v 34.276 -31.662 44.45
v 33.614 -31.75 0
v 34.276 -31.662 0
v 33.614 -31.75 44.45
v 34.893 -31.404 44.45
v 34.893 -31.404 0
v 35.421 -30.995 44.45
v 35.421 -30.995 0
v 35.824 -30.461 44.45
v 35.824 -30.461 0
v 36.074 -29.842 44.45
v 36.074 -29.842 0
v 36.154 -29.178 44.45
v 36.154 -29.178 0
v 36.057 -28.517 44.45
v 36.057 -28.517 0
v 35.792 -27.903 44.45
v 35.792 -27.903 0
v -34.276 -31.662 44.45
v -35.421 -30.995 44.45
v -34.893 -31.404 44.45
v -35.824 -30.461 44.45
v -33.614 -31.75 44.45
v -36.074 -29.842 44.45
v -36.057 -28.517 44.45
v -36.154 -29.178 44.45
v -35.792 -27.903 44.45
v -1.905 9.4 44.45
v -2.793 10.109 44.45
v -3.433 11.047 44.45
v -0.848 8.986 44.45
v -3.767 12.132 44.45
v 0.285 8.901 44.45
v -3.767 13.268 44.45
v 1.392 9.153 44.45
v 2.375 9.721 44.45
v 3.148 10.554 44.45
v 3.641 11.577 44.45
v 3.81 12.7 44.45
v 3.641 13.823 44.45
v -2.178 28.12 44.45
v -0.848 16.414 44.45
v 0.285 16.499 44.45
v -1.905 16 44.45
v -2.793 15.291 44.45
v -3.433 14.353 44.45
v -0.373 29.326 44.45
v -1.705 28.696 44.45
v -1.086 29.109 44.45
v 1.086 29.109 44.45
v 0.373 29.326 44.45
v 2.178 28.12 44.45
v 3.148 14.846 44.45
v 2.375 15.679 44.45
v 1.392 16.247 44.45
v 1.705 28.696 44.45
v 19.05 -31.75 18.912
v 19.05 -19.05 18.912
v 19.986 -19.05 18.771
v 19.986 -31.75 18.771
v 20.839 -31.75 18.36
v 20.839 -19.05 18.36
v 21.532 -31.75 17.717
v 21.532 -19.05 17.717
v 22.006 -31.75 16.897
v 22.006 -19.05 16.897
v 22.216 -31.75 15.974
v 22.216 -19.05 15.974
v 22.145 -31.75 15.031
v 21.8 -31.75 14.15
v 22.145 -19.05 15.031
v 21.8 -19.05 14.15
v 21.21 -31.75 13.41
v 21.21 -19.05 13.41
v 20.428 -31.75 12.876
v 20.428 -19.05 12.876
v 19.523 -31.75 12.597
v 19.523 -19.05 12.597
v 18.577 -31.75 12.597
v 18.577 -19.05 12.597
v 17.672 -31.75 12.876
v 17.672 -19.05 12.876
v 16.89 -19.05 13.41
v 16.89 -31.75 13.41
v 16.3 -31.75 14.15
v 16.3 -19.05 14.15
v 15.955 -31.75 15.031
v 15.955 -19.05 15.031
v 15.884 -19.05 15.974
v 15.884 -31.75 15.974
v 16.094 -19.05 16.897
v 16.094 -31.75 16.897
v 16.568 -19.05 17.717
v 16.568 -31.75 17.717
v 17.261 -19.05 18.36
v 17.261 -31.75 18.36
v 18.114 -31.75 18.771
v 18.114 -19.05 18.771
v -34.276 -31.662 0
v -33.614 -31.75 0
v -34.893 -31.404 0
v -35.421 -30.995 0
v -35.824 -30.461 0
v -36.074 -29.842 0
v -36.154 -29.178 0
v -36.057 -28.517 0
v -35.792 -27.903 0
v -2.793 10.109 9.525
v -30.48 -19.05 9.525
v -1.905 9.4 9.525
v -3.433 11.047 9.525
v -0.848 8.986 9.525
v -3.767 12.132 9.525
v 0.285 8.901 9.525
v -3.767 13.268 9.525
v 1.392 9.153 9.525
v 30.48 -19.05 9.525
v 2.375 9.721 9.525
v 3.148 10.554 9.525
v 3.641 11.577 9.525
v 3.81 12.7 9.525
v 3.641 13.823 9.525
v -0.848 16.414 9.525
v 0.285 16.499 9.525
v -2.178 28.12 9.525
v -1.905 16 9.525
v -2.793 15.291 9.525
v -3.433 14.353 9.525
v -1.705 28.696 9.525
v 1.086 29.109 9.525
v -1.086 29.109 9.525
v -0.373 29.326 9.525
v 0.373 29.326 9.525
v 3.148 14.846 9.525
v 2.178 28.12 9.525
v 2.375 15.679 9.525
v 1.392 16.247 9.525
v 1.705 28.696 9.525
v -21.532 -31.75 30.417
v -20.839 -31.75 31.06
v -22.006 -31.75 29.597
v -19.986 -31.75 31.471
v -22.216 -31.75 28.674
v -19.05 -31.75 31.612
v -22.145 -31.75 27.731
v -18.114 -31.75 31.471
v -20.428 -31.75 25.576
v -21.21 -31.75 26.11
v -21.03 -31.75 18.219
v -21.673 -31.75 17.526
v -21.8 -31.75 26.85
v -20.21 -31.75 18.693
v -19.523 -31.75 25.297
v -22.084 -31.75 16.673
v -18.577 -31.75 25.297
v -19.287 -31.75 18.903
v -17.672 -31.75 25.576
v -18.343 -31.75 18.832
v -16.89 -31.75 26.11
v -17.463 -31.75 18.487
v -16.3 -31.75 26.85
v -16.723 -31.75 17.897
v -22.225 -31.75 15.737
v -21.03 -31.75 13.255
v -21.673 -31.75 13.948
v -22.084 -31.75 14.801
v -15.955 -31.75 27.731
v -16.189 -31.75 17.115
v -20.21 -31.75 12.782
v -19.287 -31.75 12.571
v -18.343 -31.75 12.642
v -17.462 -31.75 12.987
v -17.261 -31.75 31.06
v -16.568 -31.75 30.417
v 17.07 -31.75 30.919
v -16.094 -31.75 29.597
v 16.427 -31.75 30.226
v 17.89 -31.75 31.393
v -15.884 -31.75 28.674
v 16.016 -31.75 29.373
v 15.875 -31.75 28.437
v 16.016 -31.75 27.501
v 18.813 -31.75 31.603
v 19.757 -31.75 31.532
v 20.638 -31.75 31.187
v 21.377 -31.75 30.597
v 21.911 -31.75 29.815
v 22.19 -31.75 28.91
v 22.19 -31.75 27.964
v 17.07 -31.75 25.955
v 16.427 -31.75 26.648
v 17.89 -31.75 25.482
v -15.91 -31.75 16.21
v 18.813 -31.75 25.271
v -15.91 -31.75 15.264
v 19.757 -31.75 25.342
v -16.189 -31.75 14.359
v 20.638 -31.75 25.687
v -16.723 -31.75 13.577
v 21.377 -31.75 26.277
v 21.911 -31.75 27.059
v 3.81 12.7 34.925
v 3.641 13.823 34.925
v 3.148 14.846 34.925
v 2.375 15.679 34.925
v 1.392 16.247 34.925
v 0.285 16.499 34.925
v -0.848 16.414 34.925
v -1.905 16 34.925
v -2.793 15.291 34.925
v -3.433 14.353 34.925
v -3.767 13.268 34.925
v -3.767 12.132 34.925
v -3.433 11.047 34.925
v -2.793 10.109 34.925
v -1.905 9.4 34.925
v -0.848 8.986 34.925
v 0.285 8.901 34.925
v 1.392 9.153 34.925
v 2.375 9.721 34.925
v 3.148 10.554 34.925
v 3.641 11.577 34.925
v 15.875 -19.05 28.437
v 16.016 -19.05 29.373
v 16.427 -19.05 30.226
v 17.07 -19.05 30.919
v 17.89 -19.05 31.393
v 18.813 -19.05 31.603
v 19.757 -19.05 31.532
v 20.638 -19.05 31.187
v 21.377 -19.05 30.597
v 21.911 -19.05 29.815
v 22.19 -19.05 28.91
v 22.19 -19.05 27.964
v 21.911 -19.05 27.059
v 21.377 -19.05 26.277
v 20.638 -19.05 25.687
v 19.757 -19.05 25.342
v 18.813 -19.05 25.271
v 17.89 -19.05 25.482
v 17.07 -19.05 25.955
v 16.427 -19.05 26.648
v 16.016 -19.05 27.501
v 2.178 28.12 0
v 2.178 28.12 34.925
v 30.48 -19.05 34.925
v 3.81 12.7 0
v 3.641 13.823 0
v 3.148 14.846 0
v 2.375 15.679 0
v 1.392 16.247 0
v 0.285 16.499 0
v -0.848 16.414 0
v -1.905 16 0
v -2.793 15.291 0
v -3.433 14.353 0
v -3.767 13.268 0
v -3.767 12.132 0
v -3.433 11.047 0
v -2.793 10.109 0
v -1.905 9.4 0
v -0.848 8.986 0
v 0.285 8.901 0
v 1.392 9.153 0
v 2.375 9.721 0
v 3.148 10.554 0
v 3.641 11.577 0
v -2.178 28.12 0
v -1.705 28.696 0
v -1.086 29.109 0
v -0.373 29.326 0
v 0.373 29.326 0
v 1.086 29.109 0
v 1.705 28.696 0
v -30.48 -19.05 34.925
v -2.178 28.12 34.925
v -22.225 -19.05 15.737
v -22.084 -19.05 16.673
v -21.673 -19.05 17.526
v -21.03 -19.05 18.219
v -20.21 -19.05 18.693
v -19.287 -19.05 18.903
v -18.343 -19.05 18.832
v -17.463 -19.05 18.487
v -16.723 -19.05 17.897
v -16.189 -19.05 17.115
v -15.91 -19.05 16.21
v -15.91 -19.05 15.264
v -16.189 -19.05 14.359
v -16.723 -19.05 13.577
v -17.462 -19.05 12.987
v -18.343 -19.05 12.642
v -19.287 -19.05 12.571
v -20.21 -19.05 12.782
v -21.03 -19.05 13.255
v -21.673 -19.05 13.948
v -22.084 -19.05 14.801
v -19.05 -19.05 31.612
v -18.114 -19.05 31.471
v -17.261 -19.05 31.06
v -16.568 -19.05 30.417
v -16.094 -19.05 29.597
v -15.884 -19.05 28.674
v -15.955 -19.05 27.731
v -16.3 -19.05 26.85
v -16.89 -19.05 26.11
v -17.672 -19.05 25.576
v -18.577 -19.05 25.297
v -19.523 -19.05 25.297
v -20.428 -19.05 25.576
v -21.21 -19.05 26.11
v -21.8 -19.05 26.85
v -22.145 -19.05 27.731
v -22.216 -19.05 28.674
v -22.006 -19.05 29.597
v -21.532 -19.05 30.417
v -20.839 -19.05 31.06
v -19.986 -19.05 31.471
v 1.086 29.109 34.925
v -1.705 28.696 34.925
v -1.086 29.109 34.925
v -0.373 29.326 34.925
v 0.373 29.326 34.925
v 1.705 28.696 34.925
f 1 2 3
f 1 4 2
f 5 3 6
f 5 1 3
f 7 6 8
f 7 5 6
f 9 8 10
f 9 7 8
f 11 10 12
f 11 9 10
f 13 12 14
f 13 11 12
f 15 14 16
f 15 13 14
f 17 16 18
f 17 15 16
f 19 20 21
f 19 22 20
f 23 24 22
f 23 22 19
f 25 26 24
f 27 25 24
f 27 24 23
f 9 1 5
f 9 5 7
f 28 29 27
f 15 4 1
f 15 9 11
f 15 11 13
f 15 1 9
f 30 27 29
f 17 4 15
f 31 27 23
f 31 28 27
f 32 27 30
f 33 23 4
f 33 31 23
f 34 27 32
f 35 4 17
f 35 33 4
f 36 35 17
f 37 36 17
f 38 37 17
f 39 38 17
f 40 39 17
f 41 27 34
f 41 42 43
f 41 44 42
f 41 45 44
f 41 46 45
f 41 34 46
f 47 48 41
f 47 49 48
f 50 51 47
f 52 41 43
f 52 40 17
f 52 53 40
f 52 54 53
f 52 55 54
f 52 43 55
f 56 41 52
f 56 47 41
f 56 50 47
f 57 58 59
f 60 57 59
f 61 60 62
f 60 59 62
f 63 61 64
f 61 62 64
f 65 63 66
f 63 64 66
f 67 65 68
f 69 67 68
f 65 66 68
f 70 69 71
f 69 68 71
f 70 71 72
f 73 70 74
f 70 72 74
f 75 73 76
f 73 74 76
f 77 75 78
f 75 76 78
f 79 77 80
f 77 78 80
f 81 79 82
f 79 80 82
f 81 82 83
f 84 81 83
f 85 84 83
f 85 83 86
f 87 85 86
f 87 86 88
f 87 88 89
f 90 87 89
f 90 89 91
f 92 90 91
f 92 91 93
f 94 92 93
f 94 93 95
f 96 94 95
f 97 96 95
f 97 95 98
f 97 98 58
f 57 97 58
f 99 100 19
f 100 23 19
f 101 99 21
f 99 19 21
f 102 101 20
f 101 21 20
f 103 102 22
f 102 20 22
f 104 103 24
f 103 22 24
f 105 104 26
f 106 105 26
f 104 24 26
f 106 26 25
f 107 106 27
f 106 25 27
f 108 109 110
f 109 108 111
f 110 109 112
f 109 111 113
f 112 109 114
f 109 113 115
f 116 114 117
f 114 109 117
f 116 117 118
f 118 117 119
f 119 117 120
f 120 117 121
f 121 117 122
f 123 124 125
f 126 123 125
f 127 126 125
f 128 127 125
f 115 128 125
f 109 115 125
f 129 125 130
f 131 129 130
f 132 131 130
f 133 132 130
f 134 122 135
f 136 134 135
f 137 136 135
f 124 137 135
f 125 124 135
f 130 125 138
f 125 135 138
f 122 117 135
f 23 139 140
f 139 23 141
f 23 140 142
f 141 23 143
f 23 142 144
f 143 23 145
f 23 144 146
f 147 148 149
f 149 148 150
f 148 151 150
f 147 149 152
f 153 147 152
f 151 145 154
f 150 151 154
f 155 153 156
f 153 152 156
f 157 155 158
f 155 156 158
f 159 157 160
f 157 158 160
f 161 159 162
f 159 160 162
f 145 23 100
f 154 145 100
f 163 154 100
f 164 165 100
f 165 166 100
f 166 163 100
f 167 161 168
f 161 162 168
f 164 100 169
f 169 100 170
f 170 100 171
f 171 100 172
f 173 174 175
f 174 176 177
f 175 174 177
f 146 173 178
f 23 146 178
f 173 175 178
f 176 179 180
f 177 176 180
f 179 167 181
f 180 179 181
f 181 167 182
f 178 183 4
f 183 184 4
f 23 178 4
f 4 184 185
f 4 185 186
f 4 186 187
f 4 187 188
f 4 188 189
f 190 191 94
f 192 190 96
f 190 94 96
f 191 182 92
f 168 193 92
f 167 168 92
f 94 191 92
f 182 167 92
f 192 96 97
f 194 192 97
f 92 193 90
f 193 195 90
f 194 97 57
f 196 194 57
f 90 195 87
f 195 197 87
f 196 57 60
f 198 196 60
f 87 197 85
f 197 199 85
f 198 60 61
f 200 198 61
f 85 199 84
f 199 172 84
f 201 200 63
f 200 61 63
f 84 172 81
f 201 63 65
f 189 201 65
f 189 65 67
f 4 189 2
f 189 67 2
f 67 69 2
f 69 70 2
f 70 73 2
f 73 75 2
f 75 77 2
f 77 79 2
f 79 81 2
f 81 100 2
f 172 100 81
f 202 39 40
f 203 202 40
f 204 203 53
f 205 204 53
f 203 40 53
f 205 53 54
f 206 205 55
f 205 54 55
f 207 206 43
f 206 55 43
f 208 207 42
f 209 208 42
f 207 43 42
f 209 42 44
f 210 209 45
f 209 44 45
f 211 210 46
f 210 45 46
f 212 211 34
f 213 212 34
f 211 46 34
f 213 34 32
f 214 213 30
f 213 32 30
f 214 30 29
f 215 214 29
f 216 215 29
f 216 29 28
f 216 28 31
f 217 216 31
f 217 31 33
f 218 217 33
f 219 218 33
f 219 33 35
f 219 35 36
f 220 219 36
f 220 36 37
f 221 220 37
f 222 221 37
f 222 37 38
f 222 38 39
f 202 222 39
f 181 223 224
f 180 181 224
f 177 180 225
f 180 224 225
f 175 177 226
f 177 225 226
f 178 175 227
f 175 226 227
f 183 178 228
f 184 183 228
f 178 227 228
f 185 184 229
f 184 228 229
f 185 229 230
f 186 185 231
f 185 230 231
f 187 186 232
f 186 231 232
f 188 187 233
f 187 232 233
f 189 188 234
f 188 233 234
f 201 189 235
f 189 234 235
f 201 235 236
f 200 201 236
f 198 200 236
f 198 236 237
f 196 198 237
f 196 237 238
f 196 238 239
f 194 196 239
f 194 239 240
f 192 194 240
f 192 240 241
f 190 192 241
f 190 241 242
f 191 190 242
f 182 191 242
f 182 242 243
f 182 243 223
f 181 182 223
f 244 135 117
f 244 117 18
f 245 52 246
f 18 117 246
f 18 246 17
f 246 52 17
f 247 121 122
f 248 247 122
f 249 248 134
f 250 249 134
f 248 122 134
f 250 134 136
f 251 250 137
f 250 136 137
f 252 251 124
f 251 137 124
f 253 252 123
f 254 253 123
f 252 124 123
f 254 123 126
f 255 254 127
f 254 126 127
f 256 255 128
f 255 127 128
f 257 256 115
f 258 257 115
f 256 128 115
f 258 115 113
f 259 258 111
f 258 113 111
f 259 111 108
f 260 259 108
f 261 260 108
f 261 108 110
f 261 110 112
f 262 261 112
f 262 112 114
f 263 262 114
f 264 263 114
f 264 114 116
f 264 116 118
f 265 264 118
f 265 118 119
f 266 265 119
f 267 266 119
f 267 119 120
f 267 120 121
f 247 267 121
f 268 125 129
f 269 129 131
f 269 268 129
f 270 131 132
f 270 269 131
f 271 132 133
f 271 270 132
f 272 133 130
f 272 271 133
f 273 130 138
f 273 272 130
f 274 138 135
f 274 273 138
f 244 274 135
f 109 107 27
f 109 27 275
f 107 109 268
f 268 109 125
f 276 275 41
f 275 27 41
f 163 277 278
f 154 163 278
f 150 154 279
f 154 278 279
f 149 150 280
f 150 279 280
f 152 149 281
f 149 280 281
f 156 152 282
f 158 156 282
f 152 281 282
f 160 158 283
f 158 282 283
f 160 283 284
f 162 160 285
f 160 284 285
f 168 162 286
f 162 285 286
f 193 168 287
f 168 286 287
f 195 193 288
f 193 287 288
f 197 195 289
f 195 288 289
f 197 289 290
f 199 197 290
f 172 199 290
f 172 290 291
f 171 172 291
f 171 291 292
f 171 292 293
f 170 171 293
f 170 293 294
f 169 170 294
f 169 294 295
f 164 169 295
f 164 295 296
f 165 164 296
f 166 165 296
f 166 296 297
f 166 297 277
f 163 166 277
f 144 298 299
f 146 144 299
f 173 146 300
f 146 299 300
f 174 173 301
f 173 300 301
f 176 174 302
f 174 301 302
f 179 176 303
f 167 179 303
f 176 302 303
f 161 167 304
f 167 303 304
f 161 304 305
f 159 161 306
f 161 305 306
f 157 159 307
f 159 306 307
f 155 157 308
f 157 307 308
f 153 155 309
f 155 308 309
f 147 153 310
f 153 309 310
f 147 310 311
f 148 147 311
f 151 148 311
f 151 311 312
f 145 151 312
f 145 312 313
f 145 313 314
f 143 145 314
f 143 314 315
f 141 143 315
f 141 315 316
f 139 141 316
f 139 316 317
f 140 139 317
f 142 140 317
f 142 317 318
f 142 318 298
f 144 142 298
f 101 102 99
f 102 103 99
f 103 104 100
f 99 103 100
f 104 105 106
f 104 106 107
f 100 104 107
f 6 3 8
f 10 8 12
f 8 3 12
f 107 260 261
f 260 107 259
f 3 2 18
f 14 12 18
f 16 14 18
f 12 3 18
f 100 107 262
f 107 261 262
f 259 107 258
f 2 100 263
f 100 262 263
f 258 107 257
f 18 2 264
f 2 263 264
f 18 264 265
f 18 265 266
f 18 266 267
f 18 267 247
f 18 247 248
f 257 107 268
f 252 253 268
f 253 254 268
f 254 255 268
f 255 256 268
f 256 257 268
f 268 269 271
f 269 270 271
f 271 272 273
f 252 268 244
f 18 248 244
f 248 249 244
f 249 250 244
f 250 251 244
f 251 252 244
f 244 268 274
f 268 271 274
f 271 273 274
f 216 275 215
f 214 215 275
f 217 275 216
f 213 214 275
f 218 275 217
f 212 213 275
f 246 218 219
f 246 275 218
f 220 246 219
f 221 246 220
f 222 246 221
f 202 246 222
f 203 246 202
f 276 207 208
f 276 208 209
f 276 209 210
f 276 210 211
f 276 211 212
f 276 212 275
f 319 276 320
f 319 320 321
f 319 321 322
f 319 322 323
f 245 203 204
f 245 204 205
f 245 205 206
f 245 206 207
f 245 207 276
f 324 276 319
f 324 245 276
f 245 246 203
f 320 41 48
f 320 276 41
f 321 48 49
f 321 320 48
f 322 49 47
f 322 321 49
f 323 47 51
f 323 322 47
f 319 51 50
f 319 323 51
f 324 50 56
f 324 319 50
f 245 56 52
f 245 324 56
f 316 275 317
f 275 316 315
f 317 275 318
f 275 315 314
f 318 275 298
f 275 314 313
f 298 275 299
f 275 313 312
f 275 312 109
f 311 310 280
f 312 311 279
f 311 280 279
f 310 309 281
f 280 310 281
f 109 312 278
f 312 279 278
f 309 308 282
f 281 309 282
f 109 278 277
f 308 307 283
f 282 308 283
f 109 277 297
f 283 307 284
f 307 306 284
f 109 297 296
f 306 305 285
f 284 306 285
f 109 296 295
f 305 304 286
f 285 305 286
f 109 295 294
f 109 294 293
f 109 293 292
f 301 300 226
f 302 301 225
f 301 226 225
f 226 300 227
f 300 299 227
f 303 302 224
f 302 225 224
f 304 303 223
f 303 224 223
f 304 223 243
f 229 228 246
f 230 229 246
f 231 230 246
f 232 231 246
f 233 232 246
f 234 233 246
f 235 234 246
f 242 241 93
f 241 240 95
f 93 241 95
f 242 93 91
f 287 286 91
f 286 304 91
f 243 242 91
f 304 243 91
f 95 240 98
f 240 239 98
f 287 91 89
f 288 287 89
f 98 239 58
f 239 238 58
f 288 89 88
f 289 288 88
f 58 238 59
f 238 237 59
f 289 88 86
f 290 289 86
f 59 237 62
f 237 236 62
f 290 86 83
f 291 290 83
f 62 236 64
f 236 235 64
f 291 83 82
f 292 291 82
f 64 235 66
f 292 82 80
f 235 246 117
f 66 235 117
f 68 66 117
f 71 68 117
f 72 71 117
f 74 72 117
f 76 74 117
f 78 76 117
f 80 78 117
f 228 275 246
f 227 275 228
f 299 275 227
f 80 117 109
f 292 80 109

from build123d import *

# Parameters (mm, degrees)
SKETCH2_W           = 76.2
SKETCH2_H           = 63.5
BOSS_EXTRUDE1_DEPTH = 44.45
SKETCH5_W           = 25.4
SKETCH5_H           = 50.8
CUT_EXTRUDE3_DEPTH  = 94.756626432
CUT_EXTRUDE4_DEPTH  = 44.45
CUT_EXTRUDE5_DEPTH  = 67.599361859
SKETCH7_R           = 3.175
CUT_EXTRUDE6_DEPTH  = 44.45
SKETCH8_R           = 3.81
CUT_EXTRUDE7_DEPTH  = 67.599361859
FILLET3_R           = 2.54


with BuildPart() as part:
    # Sketch2 → Boss-Extrude1 (new body)
    with BuildSketch(Plane.XY):
        Rectangle(SKETCH2_W, SKETCH2_H)
    extrude(amount=BOSS_EXTRUDE1_DEPTH)

    # Sketch5 → Cut-Extrude3 (cut, through all)
    with BuildSketch(Plane(origin=(38.1, 0, 0), x_dir=(0, 0, -1), z_dir=(1, 0, 0))):
        with Locations((-22.225, 6.35)):
            Rectangle(SKETCH5_W, SKETCH5_H)
    extrude(amount=-CUT_EXTRUDE3_DEPTH, mode=Mode.SUBTRACT)

    # Sketch3 → Cut-Extrude4 (cut)
    with BuildSketch(Plane.XY.offset(44.45)):
        Polygon((-38.1, -31.75), (0, 31.75), (-38.1, 31.75), align=None)
    extrude(amount=-CUT_EXTRUDE4_DEPTH, mode=Mode.SUBTRACT)

    # Sketch6 → Cut-Extrude5 (cut, through all)
    with BuildSketch(Plane.XY.offset(44.45)):
        Polygon((0, 31.75), (38.1, -31.75), (38.1, 31.75), align=None)
    extrude(amount=-CUT_EXTRUDE5_DEPTH, mode=Mode.SUBTRACT)

    # Sketch7 → Cut-Extrude6 (cut)
    with BuildSketch(Plane(origin=(0, -19.05, 0), x_dir=(1, 0, 0), z_dir=(0, 1, 0))):
        with Locations(Location((-19.05, -15.737033212, 0), (0, 0, 180))):
            Circle(SKETCH7_R)
        with Locations(Location((19.05, -15.737033212, 0), (0, 0, 270))):
            Circle(SKETCH7_R)
        with Locations(Location((19.05, -28.437033212, 0), (0, 0, 180))):
            Circle(SKETCH7_R)
        with Locations(Location((-19.05, -28.437033212, 0), (0, 0, 270))):
            Circle(SKETCH7_R)
    extrude(amount=-CUT_EXTRUDE6_DEPTH, mode=Mode.SUBTRACT)

    # Sketch8 → Cut-Extrude7 (cut, through all)
    with BuildSketch(Plane.XY.offset(44.45)):
        with Locations((0, 12.7)):
            Circle(SKETCH8_R)
    extrude(amount=-CUT_EXTRUDE7_DEPTH, mode=Mode.SUBTRACT)

    # Fillet3
    fillet3_edges = [part.edges().sort_by_distance(p)[0] for p in [
        (0, 31.75, 4.7625),
        (0, 31.75, 39.6875),
        (38.1, -31.75, 22.225),
        (-38.1, -31.75, 22.225),
    ]]
    fillet(fillet3_edges, radius=FILLET3_R)


solid = part.part
